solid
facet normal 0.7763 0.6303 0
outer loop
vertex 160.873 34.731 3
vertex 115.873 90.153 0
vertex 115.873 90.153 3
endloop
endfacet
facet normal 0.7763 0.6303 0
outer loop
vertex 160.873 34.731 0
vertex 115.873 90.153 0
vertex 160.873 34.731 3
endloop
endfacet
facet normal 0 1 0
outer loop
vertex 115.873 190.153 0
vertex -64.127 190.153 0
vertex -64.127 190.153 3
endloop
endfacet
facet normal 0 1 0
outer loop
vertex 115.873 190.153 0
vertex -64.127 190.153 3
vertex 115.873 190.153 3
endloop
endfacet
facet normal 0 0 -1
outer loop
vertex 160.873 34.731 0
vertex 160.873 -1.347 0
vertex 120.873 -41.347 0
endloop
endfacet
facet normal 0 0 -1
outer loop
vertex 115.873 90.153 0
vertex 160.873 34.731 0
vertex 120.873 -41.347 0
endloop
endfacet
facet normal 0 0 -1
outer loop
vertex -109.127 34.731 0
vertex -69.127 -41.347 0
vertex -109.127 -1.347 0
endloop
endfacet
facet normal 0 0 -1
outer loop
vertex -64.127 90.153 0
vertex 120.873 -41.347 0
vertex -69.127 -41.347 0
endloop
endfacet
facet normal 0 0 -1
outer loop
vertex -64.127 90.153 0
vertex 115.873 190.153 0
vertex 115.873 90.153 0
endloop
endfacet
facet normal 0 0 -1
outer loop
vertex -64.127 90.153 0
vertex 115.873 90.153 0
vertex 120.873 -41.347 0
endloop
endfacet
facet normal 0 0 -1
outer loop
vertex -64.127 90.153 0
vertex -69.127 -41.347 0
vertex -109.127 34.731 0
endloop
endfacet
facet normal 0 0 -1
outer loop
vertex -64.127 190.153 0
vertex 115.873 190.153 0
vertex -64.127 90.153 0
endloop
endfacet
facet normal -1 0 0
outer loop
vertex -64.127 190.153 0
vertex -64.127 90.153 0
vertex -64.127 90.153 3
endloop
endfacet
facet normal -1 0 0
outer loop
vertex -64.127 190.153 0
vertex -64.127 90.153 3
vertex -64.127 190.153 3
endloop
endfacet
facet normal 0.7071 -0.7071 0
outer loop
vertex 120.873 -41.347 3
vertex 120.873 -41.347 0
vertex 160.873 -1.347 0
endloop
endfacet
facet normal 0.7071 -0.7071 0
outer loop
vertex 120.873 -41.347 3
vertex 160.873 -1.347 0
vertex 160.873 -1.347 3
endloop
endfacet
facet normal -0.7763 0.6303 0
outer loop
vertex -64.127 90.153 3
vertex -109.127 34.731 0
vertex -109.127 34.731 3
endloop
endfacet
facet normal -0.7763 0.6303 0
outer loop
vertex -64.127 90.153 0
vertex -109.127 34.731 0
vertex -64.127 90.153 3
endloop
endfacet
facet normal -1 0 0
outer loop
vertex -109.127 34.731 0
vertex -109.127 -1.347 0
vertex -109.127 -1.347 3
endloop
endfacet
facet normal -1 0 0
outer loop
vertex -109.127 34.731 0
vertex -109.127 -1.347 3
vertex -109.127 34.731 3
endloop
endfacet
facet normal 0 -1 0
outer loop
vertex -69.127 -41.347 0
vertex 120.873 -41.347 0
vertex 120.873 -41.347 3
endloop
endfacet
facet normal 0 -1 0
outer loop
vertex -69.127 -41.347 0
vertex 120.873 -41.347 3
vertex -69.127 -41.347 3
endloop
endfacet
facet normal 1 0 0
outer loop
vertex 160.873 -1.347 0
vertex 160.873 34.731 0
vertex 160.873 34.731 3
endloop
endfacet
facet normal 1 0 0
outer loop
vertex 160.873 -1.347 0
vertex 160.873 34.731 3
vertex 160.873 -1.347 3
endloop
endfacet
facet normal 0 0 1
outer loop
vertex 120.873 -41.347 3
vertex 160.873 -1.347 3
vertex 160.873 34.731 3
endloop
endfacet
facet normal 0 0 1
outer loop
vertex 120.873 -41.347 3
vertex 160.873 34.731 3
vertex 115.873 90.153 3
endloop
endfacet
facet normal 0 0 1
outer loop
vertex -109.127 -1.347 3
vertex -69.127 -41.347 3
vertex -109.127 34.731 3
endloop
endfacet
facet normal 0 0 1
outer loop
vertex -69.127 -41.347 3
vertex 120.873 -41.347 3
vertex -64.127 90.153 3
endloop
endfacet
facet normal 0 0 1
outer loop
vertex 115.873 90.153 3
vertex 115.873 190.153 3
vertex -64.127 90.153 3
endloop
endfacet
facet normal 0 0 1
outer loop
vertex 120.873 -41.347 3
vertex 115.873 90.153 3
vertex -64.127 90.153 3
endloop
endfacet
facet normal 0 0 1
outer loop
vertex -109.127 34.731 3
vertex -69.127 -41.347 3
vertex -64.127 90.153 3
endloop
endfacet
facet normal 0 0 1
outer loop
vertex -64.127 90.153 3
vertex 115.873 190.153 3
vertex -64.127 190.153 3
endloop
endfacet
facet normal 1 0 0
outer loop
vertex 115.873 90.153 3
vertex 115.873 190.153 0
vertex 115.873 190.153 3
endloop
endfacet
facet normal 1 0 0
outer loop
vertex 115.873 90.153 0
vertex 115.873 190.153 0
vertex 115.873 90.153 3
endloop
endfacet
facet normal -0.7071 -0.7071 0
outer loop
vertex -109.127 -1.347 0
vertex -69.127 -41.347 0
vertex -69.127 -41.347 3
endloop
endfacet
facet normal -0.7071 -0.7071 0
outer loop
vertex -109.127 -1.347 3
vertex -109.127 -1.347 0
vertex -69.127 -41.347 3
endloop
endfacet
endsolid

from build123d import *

# Parameters (mm, degrees)
BOSS_EXTRU_1_DEPTH = 3
CHANFREIN1_SIZE    = 40


with BuildPart() as part:
    # Esquisse1 → Boss.-Extru.1 (new body)
    with BuildSketch(Plane.XY):
        Polygon((115.873312648, 190.152785154), (115.873312648, 90.152785154), (160.873312648, 34.730964145), (160.873312648, -41.347214846), (-109.126687352, -41.347214846), (-109.126687352, 34.730964145), (-64.126687352, 90.152785154), (-64.126687352, 190.152785154), align=None)
    extrude(amount=BOSS_EXTRU_1_DEPTH)

    # Chanfrein1
    chanfrein1_edges = [part.edges().sort_by_distance(p)[0] for p in [
        (160.873312648, -41.347214846, 1.5),
        (-109.126687352, -41.347214846, 1.5),
    ]]
    chamfer(chanfrein1_edges, length=CHANFREIN1_SIZE)


solid = part.part
